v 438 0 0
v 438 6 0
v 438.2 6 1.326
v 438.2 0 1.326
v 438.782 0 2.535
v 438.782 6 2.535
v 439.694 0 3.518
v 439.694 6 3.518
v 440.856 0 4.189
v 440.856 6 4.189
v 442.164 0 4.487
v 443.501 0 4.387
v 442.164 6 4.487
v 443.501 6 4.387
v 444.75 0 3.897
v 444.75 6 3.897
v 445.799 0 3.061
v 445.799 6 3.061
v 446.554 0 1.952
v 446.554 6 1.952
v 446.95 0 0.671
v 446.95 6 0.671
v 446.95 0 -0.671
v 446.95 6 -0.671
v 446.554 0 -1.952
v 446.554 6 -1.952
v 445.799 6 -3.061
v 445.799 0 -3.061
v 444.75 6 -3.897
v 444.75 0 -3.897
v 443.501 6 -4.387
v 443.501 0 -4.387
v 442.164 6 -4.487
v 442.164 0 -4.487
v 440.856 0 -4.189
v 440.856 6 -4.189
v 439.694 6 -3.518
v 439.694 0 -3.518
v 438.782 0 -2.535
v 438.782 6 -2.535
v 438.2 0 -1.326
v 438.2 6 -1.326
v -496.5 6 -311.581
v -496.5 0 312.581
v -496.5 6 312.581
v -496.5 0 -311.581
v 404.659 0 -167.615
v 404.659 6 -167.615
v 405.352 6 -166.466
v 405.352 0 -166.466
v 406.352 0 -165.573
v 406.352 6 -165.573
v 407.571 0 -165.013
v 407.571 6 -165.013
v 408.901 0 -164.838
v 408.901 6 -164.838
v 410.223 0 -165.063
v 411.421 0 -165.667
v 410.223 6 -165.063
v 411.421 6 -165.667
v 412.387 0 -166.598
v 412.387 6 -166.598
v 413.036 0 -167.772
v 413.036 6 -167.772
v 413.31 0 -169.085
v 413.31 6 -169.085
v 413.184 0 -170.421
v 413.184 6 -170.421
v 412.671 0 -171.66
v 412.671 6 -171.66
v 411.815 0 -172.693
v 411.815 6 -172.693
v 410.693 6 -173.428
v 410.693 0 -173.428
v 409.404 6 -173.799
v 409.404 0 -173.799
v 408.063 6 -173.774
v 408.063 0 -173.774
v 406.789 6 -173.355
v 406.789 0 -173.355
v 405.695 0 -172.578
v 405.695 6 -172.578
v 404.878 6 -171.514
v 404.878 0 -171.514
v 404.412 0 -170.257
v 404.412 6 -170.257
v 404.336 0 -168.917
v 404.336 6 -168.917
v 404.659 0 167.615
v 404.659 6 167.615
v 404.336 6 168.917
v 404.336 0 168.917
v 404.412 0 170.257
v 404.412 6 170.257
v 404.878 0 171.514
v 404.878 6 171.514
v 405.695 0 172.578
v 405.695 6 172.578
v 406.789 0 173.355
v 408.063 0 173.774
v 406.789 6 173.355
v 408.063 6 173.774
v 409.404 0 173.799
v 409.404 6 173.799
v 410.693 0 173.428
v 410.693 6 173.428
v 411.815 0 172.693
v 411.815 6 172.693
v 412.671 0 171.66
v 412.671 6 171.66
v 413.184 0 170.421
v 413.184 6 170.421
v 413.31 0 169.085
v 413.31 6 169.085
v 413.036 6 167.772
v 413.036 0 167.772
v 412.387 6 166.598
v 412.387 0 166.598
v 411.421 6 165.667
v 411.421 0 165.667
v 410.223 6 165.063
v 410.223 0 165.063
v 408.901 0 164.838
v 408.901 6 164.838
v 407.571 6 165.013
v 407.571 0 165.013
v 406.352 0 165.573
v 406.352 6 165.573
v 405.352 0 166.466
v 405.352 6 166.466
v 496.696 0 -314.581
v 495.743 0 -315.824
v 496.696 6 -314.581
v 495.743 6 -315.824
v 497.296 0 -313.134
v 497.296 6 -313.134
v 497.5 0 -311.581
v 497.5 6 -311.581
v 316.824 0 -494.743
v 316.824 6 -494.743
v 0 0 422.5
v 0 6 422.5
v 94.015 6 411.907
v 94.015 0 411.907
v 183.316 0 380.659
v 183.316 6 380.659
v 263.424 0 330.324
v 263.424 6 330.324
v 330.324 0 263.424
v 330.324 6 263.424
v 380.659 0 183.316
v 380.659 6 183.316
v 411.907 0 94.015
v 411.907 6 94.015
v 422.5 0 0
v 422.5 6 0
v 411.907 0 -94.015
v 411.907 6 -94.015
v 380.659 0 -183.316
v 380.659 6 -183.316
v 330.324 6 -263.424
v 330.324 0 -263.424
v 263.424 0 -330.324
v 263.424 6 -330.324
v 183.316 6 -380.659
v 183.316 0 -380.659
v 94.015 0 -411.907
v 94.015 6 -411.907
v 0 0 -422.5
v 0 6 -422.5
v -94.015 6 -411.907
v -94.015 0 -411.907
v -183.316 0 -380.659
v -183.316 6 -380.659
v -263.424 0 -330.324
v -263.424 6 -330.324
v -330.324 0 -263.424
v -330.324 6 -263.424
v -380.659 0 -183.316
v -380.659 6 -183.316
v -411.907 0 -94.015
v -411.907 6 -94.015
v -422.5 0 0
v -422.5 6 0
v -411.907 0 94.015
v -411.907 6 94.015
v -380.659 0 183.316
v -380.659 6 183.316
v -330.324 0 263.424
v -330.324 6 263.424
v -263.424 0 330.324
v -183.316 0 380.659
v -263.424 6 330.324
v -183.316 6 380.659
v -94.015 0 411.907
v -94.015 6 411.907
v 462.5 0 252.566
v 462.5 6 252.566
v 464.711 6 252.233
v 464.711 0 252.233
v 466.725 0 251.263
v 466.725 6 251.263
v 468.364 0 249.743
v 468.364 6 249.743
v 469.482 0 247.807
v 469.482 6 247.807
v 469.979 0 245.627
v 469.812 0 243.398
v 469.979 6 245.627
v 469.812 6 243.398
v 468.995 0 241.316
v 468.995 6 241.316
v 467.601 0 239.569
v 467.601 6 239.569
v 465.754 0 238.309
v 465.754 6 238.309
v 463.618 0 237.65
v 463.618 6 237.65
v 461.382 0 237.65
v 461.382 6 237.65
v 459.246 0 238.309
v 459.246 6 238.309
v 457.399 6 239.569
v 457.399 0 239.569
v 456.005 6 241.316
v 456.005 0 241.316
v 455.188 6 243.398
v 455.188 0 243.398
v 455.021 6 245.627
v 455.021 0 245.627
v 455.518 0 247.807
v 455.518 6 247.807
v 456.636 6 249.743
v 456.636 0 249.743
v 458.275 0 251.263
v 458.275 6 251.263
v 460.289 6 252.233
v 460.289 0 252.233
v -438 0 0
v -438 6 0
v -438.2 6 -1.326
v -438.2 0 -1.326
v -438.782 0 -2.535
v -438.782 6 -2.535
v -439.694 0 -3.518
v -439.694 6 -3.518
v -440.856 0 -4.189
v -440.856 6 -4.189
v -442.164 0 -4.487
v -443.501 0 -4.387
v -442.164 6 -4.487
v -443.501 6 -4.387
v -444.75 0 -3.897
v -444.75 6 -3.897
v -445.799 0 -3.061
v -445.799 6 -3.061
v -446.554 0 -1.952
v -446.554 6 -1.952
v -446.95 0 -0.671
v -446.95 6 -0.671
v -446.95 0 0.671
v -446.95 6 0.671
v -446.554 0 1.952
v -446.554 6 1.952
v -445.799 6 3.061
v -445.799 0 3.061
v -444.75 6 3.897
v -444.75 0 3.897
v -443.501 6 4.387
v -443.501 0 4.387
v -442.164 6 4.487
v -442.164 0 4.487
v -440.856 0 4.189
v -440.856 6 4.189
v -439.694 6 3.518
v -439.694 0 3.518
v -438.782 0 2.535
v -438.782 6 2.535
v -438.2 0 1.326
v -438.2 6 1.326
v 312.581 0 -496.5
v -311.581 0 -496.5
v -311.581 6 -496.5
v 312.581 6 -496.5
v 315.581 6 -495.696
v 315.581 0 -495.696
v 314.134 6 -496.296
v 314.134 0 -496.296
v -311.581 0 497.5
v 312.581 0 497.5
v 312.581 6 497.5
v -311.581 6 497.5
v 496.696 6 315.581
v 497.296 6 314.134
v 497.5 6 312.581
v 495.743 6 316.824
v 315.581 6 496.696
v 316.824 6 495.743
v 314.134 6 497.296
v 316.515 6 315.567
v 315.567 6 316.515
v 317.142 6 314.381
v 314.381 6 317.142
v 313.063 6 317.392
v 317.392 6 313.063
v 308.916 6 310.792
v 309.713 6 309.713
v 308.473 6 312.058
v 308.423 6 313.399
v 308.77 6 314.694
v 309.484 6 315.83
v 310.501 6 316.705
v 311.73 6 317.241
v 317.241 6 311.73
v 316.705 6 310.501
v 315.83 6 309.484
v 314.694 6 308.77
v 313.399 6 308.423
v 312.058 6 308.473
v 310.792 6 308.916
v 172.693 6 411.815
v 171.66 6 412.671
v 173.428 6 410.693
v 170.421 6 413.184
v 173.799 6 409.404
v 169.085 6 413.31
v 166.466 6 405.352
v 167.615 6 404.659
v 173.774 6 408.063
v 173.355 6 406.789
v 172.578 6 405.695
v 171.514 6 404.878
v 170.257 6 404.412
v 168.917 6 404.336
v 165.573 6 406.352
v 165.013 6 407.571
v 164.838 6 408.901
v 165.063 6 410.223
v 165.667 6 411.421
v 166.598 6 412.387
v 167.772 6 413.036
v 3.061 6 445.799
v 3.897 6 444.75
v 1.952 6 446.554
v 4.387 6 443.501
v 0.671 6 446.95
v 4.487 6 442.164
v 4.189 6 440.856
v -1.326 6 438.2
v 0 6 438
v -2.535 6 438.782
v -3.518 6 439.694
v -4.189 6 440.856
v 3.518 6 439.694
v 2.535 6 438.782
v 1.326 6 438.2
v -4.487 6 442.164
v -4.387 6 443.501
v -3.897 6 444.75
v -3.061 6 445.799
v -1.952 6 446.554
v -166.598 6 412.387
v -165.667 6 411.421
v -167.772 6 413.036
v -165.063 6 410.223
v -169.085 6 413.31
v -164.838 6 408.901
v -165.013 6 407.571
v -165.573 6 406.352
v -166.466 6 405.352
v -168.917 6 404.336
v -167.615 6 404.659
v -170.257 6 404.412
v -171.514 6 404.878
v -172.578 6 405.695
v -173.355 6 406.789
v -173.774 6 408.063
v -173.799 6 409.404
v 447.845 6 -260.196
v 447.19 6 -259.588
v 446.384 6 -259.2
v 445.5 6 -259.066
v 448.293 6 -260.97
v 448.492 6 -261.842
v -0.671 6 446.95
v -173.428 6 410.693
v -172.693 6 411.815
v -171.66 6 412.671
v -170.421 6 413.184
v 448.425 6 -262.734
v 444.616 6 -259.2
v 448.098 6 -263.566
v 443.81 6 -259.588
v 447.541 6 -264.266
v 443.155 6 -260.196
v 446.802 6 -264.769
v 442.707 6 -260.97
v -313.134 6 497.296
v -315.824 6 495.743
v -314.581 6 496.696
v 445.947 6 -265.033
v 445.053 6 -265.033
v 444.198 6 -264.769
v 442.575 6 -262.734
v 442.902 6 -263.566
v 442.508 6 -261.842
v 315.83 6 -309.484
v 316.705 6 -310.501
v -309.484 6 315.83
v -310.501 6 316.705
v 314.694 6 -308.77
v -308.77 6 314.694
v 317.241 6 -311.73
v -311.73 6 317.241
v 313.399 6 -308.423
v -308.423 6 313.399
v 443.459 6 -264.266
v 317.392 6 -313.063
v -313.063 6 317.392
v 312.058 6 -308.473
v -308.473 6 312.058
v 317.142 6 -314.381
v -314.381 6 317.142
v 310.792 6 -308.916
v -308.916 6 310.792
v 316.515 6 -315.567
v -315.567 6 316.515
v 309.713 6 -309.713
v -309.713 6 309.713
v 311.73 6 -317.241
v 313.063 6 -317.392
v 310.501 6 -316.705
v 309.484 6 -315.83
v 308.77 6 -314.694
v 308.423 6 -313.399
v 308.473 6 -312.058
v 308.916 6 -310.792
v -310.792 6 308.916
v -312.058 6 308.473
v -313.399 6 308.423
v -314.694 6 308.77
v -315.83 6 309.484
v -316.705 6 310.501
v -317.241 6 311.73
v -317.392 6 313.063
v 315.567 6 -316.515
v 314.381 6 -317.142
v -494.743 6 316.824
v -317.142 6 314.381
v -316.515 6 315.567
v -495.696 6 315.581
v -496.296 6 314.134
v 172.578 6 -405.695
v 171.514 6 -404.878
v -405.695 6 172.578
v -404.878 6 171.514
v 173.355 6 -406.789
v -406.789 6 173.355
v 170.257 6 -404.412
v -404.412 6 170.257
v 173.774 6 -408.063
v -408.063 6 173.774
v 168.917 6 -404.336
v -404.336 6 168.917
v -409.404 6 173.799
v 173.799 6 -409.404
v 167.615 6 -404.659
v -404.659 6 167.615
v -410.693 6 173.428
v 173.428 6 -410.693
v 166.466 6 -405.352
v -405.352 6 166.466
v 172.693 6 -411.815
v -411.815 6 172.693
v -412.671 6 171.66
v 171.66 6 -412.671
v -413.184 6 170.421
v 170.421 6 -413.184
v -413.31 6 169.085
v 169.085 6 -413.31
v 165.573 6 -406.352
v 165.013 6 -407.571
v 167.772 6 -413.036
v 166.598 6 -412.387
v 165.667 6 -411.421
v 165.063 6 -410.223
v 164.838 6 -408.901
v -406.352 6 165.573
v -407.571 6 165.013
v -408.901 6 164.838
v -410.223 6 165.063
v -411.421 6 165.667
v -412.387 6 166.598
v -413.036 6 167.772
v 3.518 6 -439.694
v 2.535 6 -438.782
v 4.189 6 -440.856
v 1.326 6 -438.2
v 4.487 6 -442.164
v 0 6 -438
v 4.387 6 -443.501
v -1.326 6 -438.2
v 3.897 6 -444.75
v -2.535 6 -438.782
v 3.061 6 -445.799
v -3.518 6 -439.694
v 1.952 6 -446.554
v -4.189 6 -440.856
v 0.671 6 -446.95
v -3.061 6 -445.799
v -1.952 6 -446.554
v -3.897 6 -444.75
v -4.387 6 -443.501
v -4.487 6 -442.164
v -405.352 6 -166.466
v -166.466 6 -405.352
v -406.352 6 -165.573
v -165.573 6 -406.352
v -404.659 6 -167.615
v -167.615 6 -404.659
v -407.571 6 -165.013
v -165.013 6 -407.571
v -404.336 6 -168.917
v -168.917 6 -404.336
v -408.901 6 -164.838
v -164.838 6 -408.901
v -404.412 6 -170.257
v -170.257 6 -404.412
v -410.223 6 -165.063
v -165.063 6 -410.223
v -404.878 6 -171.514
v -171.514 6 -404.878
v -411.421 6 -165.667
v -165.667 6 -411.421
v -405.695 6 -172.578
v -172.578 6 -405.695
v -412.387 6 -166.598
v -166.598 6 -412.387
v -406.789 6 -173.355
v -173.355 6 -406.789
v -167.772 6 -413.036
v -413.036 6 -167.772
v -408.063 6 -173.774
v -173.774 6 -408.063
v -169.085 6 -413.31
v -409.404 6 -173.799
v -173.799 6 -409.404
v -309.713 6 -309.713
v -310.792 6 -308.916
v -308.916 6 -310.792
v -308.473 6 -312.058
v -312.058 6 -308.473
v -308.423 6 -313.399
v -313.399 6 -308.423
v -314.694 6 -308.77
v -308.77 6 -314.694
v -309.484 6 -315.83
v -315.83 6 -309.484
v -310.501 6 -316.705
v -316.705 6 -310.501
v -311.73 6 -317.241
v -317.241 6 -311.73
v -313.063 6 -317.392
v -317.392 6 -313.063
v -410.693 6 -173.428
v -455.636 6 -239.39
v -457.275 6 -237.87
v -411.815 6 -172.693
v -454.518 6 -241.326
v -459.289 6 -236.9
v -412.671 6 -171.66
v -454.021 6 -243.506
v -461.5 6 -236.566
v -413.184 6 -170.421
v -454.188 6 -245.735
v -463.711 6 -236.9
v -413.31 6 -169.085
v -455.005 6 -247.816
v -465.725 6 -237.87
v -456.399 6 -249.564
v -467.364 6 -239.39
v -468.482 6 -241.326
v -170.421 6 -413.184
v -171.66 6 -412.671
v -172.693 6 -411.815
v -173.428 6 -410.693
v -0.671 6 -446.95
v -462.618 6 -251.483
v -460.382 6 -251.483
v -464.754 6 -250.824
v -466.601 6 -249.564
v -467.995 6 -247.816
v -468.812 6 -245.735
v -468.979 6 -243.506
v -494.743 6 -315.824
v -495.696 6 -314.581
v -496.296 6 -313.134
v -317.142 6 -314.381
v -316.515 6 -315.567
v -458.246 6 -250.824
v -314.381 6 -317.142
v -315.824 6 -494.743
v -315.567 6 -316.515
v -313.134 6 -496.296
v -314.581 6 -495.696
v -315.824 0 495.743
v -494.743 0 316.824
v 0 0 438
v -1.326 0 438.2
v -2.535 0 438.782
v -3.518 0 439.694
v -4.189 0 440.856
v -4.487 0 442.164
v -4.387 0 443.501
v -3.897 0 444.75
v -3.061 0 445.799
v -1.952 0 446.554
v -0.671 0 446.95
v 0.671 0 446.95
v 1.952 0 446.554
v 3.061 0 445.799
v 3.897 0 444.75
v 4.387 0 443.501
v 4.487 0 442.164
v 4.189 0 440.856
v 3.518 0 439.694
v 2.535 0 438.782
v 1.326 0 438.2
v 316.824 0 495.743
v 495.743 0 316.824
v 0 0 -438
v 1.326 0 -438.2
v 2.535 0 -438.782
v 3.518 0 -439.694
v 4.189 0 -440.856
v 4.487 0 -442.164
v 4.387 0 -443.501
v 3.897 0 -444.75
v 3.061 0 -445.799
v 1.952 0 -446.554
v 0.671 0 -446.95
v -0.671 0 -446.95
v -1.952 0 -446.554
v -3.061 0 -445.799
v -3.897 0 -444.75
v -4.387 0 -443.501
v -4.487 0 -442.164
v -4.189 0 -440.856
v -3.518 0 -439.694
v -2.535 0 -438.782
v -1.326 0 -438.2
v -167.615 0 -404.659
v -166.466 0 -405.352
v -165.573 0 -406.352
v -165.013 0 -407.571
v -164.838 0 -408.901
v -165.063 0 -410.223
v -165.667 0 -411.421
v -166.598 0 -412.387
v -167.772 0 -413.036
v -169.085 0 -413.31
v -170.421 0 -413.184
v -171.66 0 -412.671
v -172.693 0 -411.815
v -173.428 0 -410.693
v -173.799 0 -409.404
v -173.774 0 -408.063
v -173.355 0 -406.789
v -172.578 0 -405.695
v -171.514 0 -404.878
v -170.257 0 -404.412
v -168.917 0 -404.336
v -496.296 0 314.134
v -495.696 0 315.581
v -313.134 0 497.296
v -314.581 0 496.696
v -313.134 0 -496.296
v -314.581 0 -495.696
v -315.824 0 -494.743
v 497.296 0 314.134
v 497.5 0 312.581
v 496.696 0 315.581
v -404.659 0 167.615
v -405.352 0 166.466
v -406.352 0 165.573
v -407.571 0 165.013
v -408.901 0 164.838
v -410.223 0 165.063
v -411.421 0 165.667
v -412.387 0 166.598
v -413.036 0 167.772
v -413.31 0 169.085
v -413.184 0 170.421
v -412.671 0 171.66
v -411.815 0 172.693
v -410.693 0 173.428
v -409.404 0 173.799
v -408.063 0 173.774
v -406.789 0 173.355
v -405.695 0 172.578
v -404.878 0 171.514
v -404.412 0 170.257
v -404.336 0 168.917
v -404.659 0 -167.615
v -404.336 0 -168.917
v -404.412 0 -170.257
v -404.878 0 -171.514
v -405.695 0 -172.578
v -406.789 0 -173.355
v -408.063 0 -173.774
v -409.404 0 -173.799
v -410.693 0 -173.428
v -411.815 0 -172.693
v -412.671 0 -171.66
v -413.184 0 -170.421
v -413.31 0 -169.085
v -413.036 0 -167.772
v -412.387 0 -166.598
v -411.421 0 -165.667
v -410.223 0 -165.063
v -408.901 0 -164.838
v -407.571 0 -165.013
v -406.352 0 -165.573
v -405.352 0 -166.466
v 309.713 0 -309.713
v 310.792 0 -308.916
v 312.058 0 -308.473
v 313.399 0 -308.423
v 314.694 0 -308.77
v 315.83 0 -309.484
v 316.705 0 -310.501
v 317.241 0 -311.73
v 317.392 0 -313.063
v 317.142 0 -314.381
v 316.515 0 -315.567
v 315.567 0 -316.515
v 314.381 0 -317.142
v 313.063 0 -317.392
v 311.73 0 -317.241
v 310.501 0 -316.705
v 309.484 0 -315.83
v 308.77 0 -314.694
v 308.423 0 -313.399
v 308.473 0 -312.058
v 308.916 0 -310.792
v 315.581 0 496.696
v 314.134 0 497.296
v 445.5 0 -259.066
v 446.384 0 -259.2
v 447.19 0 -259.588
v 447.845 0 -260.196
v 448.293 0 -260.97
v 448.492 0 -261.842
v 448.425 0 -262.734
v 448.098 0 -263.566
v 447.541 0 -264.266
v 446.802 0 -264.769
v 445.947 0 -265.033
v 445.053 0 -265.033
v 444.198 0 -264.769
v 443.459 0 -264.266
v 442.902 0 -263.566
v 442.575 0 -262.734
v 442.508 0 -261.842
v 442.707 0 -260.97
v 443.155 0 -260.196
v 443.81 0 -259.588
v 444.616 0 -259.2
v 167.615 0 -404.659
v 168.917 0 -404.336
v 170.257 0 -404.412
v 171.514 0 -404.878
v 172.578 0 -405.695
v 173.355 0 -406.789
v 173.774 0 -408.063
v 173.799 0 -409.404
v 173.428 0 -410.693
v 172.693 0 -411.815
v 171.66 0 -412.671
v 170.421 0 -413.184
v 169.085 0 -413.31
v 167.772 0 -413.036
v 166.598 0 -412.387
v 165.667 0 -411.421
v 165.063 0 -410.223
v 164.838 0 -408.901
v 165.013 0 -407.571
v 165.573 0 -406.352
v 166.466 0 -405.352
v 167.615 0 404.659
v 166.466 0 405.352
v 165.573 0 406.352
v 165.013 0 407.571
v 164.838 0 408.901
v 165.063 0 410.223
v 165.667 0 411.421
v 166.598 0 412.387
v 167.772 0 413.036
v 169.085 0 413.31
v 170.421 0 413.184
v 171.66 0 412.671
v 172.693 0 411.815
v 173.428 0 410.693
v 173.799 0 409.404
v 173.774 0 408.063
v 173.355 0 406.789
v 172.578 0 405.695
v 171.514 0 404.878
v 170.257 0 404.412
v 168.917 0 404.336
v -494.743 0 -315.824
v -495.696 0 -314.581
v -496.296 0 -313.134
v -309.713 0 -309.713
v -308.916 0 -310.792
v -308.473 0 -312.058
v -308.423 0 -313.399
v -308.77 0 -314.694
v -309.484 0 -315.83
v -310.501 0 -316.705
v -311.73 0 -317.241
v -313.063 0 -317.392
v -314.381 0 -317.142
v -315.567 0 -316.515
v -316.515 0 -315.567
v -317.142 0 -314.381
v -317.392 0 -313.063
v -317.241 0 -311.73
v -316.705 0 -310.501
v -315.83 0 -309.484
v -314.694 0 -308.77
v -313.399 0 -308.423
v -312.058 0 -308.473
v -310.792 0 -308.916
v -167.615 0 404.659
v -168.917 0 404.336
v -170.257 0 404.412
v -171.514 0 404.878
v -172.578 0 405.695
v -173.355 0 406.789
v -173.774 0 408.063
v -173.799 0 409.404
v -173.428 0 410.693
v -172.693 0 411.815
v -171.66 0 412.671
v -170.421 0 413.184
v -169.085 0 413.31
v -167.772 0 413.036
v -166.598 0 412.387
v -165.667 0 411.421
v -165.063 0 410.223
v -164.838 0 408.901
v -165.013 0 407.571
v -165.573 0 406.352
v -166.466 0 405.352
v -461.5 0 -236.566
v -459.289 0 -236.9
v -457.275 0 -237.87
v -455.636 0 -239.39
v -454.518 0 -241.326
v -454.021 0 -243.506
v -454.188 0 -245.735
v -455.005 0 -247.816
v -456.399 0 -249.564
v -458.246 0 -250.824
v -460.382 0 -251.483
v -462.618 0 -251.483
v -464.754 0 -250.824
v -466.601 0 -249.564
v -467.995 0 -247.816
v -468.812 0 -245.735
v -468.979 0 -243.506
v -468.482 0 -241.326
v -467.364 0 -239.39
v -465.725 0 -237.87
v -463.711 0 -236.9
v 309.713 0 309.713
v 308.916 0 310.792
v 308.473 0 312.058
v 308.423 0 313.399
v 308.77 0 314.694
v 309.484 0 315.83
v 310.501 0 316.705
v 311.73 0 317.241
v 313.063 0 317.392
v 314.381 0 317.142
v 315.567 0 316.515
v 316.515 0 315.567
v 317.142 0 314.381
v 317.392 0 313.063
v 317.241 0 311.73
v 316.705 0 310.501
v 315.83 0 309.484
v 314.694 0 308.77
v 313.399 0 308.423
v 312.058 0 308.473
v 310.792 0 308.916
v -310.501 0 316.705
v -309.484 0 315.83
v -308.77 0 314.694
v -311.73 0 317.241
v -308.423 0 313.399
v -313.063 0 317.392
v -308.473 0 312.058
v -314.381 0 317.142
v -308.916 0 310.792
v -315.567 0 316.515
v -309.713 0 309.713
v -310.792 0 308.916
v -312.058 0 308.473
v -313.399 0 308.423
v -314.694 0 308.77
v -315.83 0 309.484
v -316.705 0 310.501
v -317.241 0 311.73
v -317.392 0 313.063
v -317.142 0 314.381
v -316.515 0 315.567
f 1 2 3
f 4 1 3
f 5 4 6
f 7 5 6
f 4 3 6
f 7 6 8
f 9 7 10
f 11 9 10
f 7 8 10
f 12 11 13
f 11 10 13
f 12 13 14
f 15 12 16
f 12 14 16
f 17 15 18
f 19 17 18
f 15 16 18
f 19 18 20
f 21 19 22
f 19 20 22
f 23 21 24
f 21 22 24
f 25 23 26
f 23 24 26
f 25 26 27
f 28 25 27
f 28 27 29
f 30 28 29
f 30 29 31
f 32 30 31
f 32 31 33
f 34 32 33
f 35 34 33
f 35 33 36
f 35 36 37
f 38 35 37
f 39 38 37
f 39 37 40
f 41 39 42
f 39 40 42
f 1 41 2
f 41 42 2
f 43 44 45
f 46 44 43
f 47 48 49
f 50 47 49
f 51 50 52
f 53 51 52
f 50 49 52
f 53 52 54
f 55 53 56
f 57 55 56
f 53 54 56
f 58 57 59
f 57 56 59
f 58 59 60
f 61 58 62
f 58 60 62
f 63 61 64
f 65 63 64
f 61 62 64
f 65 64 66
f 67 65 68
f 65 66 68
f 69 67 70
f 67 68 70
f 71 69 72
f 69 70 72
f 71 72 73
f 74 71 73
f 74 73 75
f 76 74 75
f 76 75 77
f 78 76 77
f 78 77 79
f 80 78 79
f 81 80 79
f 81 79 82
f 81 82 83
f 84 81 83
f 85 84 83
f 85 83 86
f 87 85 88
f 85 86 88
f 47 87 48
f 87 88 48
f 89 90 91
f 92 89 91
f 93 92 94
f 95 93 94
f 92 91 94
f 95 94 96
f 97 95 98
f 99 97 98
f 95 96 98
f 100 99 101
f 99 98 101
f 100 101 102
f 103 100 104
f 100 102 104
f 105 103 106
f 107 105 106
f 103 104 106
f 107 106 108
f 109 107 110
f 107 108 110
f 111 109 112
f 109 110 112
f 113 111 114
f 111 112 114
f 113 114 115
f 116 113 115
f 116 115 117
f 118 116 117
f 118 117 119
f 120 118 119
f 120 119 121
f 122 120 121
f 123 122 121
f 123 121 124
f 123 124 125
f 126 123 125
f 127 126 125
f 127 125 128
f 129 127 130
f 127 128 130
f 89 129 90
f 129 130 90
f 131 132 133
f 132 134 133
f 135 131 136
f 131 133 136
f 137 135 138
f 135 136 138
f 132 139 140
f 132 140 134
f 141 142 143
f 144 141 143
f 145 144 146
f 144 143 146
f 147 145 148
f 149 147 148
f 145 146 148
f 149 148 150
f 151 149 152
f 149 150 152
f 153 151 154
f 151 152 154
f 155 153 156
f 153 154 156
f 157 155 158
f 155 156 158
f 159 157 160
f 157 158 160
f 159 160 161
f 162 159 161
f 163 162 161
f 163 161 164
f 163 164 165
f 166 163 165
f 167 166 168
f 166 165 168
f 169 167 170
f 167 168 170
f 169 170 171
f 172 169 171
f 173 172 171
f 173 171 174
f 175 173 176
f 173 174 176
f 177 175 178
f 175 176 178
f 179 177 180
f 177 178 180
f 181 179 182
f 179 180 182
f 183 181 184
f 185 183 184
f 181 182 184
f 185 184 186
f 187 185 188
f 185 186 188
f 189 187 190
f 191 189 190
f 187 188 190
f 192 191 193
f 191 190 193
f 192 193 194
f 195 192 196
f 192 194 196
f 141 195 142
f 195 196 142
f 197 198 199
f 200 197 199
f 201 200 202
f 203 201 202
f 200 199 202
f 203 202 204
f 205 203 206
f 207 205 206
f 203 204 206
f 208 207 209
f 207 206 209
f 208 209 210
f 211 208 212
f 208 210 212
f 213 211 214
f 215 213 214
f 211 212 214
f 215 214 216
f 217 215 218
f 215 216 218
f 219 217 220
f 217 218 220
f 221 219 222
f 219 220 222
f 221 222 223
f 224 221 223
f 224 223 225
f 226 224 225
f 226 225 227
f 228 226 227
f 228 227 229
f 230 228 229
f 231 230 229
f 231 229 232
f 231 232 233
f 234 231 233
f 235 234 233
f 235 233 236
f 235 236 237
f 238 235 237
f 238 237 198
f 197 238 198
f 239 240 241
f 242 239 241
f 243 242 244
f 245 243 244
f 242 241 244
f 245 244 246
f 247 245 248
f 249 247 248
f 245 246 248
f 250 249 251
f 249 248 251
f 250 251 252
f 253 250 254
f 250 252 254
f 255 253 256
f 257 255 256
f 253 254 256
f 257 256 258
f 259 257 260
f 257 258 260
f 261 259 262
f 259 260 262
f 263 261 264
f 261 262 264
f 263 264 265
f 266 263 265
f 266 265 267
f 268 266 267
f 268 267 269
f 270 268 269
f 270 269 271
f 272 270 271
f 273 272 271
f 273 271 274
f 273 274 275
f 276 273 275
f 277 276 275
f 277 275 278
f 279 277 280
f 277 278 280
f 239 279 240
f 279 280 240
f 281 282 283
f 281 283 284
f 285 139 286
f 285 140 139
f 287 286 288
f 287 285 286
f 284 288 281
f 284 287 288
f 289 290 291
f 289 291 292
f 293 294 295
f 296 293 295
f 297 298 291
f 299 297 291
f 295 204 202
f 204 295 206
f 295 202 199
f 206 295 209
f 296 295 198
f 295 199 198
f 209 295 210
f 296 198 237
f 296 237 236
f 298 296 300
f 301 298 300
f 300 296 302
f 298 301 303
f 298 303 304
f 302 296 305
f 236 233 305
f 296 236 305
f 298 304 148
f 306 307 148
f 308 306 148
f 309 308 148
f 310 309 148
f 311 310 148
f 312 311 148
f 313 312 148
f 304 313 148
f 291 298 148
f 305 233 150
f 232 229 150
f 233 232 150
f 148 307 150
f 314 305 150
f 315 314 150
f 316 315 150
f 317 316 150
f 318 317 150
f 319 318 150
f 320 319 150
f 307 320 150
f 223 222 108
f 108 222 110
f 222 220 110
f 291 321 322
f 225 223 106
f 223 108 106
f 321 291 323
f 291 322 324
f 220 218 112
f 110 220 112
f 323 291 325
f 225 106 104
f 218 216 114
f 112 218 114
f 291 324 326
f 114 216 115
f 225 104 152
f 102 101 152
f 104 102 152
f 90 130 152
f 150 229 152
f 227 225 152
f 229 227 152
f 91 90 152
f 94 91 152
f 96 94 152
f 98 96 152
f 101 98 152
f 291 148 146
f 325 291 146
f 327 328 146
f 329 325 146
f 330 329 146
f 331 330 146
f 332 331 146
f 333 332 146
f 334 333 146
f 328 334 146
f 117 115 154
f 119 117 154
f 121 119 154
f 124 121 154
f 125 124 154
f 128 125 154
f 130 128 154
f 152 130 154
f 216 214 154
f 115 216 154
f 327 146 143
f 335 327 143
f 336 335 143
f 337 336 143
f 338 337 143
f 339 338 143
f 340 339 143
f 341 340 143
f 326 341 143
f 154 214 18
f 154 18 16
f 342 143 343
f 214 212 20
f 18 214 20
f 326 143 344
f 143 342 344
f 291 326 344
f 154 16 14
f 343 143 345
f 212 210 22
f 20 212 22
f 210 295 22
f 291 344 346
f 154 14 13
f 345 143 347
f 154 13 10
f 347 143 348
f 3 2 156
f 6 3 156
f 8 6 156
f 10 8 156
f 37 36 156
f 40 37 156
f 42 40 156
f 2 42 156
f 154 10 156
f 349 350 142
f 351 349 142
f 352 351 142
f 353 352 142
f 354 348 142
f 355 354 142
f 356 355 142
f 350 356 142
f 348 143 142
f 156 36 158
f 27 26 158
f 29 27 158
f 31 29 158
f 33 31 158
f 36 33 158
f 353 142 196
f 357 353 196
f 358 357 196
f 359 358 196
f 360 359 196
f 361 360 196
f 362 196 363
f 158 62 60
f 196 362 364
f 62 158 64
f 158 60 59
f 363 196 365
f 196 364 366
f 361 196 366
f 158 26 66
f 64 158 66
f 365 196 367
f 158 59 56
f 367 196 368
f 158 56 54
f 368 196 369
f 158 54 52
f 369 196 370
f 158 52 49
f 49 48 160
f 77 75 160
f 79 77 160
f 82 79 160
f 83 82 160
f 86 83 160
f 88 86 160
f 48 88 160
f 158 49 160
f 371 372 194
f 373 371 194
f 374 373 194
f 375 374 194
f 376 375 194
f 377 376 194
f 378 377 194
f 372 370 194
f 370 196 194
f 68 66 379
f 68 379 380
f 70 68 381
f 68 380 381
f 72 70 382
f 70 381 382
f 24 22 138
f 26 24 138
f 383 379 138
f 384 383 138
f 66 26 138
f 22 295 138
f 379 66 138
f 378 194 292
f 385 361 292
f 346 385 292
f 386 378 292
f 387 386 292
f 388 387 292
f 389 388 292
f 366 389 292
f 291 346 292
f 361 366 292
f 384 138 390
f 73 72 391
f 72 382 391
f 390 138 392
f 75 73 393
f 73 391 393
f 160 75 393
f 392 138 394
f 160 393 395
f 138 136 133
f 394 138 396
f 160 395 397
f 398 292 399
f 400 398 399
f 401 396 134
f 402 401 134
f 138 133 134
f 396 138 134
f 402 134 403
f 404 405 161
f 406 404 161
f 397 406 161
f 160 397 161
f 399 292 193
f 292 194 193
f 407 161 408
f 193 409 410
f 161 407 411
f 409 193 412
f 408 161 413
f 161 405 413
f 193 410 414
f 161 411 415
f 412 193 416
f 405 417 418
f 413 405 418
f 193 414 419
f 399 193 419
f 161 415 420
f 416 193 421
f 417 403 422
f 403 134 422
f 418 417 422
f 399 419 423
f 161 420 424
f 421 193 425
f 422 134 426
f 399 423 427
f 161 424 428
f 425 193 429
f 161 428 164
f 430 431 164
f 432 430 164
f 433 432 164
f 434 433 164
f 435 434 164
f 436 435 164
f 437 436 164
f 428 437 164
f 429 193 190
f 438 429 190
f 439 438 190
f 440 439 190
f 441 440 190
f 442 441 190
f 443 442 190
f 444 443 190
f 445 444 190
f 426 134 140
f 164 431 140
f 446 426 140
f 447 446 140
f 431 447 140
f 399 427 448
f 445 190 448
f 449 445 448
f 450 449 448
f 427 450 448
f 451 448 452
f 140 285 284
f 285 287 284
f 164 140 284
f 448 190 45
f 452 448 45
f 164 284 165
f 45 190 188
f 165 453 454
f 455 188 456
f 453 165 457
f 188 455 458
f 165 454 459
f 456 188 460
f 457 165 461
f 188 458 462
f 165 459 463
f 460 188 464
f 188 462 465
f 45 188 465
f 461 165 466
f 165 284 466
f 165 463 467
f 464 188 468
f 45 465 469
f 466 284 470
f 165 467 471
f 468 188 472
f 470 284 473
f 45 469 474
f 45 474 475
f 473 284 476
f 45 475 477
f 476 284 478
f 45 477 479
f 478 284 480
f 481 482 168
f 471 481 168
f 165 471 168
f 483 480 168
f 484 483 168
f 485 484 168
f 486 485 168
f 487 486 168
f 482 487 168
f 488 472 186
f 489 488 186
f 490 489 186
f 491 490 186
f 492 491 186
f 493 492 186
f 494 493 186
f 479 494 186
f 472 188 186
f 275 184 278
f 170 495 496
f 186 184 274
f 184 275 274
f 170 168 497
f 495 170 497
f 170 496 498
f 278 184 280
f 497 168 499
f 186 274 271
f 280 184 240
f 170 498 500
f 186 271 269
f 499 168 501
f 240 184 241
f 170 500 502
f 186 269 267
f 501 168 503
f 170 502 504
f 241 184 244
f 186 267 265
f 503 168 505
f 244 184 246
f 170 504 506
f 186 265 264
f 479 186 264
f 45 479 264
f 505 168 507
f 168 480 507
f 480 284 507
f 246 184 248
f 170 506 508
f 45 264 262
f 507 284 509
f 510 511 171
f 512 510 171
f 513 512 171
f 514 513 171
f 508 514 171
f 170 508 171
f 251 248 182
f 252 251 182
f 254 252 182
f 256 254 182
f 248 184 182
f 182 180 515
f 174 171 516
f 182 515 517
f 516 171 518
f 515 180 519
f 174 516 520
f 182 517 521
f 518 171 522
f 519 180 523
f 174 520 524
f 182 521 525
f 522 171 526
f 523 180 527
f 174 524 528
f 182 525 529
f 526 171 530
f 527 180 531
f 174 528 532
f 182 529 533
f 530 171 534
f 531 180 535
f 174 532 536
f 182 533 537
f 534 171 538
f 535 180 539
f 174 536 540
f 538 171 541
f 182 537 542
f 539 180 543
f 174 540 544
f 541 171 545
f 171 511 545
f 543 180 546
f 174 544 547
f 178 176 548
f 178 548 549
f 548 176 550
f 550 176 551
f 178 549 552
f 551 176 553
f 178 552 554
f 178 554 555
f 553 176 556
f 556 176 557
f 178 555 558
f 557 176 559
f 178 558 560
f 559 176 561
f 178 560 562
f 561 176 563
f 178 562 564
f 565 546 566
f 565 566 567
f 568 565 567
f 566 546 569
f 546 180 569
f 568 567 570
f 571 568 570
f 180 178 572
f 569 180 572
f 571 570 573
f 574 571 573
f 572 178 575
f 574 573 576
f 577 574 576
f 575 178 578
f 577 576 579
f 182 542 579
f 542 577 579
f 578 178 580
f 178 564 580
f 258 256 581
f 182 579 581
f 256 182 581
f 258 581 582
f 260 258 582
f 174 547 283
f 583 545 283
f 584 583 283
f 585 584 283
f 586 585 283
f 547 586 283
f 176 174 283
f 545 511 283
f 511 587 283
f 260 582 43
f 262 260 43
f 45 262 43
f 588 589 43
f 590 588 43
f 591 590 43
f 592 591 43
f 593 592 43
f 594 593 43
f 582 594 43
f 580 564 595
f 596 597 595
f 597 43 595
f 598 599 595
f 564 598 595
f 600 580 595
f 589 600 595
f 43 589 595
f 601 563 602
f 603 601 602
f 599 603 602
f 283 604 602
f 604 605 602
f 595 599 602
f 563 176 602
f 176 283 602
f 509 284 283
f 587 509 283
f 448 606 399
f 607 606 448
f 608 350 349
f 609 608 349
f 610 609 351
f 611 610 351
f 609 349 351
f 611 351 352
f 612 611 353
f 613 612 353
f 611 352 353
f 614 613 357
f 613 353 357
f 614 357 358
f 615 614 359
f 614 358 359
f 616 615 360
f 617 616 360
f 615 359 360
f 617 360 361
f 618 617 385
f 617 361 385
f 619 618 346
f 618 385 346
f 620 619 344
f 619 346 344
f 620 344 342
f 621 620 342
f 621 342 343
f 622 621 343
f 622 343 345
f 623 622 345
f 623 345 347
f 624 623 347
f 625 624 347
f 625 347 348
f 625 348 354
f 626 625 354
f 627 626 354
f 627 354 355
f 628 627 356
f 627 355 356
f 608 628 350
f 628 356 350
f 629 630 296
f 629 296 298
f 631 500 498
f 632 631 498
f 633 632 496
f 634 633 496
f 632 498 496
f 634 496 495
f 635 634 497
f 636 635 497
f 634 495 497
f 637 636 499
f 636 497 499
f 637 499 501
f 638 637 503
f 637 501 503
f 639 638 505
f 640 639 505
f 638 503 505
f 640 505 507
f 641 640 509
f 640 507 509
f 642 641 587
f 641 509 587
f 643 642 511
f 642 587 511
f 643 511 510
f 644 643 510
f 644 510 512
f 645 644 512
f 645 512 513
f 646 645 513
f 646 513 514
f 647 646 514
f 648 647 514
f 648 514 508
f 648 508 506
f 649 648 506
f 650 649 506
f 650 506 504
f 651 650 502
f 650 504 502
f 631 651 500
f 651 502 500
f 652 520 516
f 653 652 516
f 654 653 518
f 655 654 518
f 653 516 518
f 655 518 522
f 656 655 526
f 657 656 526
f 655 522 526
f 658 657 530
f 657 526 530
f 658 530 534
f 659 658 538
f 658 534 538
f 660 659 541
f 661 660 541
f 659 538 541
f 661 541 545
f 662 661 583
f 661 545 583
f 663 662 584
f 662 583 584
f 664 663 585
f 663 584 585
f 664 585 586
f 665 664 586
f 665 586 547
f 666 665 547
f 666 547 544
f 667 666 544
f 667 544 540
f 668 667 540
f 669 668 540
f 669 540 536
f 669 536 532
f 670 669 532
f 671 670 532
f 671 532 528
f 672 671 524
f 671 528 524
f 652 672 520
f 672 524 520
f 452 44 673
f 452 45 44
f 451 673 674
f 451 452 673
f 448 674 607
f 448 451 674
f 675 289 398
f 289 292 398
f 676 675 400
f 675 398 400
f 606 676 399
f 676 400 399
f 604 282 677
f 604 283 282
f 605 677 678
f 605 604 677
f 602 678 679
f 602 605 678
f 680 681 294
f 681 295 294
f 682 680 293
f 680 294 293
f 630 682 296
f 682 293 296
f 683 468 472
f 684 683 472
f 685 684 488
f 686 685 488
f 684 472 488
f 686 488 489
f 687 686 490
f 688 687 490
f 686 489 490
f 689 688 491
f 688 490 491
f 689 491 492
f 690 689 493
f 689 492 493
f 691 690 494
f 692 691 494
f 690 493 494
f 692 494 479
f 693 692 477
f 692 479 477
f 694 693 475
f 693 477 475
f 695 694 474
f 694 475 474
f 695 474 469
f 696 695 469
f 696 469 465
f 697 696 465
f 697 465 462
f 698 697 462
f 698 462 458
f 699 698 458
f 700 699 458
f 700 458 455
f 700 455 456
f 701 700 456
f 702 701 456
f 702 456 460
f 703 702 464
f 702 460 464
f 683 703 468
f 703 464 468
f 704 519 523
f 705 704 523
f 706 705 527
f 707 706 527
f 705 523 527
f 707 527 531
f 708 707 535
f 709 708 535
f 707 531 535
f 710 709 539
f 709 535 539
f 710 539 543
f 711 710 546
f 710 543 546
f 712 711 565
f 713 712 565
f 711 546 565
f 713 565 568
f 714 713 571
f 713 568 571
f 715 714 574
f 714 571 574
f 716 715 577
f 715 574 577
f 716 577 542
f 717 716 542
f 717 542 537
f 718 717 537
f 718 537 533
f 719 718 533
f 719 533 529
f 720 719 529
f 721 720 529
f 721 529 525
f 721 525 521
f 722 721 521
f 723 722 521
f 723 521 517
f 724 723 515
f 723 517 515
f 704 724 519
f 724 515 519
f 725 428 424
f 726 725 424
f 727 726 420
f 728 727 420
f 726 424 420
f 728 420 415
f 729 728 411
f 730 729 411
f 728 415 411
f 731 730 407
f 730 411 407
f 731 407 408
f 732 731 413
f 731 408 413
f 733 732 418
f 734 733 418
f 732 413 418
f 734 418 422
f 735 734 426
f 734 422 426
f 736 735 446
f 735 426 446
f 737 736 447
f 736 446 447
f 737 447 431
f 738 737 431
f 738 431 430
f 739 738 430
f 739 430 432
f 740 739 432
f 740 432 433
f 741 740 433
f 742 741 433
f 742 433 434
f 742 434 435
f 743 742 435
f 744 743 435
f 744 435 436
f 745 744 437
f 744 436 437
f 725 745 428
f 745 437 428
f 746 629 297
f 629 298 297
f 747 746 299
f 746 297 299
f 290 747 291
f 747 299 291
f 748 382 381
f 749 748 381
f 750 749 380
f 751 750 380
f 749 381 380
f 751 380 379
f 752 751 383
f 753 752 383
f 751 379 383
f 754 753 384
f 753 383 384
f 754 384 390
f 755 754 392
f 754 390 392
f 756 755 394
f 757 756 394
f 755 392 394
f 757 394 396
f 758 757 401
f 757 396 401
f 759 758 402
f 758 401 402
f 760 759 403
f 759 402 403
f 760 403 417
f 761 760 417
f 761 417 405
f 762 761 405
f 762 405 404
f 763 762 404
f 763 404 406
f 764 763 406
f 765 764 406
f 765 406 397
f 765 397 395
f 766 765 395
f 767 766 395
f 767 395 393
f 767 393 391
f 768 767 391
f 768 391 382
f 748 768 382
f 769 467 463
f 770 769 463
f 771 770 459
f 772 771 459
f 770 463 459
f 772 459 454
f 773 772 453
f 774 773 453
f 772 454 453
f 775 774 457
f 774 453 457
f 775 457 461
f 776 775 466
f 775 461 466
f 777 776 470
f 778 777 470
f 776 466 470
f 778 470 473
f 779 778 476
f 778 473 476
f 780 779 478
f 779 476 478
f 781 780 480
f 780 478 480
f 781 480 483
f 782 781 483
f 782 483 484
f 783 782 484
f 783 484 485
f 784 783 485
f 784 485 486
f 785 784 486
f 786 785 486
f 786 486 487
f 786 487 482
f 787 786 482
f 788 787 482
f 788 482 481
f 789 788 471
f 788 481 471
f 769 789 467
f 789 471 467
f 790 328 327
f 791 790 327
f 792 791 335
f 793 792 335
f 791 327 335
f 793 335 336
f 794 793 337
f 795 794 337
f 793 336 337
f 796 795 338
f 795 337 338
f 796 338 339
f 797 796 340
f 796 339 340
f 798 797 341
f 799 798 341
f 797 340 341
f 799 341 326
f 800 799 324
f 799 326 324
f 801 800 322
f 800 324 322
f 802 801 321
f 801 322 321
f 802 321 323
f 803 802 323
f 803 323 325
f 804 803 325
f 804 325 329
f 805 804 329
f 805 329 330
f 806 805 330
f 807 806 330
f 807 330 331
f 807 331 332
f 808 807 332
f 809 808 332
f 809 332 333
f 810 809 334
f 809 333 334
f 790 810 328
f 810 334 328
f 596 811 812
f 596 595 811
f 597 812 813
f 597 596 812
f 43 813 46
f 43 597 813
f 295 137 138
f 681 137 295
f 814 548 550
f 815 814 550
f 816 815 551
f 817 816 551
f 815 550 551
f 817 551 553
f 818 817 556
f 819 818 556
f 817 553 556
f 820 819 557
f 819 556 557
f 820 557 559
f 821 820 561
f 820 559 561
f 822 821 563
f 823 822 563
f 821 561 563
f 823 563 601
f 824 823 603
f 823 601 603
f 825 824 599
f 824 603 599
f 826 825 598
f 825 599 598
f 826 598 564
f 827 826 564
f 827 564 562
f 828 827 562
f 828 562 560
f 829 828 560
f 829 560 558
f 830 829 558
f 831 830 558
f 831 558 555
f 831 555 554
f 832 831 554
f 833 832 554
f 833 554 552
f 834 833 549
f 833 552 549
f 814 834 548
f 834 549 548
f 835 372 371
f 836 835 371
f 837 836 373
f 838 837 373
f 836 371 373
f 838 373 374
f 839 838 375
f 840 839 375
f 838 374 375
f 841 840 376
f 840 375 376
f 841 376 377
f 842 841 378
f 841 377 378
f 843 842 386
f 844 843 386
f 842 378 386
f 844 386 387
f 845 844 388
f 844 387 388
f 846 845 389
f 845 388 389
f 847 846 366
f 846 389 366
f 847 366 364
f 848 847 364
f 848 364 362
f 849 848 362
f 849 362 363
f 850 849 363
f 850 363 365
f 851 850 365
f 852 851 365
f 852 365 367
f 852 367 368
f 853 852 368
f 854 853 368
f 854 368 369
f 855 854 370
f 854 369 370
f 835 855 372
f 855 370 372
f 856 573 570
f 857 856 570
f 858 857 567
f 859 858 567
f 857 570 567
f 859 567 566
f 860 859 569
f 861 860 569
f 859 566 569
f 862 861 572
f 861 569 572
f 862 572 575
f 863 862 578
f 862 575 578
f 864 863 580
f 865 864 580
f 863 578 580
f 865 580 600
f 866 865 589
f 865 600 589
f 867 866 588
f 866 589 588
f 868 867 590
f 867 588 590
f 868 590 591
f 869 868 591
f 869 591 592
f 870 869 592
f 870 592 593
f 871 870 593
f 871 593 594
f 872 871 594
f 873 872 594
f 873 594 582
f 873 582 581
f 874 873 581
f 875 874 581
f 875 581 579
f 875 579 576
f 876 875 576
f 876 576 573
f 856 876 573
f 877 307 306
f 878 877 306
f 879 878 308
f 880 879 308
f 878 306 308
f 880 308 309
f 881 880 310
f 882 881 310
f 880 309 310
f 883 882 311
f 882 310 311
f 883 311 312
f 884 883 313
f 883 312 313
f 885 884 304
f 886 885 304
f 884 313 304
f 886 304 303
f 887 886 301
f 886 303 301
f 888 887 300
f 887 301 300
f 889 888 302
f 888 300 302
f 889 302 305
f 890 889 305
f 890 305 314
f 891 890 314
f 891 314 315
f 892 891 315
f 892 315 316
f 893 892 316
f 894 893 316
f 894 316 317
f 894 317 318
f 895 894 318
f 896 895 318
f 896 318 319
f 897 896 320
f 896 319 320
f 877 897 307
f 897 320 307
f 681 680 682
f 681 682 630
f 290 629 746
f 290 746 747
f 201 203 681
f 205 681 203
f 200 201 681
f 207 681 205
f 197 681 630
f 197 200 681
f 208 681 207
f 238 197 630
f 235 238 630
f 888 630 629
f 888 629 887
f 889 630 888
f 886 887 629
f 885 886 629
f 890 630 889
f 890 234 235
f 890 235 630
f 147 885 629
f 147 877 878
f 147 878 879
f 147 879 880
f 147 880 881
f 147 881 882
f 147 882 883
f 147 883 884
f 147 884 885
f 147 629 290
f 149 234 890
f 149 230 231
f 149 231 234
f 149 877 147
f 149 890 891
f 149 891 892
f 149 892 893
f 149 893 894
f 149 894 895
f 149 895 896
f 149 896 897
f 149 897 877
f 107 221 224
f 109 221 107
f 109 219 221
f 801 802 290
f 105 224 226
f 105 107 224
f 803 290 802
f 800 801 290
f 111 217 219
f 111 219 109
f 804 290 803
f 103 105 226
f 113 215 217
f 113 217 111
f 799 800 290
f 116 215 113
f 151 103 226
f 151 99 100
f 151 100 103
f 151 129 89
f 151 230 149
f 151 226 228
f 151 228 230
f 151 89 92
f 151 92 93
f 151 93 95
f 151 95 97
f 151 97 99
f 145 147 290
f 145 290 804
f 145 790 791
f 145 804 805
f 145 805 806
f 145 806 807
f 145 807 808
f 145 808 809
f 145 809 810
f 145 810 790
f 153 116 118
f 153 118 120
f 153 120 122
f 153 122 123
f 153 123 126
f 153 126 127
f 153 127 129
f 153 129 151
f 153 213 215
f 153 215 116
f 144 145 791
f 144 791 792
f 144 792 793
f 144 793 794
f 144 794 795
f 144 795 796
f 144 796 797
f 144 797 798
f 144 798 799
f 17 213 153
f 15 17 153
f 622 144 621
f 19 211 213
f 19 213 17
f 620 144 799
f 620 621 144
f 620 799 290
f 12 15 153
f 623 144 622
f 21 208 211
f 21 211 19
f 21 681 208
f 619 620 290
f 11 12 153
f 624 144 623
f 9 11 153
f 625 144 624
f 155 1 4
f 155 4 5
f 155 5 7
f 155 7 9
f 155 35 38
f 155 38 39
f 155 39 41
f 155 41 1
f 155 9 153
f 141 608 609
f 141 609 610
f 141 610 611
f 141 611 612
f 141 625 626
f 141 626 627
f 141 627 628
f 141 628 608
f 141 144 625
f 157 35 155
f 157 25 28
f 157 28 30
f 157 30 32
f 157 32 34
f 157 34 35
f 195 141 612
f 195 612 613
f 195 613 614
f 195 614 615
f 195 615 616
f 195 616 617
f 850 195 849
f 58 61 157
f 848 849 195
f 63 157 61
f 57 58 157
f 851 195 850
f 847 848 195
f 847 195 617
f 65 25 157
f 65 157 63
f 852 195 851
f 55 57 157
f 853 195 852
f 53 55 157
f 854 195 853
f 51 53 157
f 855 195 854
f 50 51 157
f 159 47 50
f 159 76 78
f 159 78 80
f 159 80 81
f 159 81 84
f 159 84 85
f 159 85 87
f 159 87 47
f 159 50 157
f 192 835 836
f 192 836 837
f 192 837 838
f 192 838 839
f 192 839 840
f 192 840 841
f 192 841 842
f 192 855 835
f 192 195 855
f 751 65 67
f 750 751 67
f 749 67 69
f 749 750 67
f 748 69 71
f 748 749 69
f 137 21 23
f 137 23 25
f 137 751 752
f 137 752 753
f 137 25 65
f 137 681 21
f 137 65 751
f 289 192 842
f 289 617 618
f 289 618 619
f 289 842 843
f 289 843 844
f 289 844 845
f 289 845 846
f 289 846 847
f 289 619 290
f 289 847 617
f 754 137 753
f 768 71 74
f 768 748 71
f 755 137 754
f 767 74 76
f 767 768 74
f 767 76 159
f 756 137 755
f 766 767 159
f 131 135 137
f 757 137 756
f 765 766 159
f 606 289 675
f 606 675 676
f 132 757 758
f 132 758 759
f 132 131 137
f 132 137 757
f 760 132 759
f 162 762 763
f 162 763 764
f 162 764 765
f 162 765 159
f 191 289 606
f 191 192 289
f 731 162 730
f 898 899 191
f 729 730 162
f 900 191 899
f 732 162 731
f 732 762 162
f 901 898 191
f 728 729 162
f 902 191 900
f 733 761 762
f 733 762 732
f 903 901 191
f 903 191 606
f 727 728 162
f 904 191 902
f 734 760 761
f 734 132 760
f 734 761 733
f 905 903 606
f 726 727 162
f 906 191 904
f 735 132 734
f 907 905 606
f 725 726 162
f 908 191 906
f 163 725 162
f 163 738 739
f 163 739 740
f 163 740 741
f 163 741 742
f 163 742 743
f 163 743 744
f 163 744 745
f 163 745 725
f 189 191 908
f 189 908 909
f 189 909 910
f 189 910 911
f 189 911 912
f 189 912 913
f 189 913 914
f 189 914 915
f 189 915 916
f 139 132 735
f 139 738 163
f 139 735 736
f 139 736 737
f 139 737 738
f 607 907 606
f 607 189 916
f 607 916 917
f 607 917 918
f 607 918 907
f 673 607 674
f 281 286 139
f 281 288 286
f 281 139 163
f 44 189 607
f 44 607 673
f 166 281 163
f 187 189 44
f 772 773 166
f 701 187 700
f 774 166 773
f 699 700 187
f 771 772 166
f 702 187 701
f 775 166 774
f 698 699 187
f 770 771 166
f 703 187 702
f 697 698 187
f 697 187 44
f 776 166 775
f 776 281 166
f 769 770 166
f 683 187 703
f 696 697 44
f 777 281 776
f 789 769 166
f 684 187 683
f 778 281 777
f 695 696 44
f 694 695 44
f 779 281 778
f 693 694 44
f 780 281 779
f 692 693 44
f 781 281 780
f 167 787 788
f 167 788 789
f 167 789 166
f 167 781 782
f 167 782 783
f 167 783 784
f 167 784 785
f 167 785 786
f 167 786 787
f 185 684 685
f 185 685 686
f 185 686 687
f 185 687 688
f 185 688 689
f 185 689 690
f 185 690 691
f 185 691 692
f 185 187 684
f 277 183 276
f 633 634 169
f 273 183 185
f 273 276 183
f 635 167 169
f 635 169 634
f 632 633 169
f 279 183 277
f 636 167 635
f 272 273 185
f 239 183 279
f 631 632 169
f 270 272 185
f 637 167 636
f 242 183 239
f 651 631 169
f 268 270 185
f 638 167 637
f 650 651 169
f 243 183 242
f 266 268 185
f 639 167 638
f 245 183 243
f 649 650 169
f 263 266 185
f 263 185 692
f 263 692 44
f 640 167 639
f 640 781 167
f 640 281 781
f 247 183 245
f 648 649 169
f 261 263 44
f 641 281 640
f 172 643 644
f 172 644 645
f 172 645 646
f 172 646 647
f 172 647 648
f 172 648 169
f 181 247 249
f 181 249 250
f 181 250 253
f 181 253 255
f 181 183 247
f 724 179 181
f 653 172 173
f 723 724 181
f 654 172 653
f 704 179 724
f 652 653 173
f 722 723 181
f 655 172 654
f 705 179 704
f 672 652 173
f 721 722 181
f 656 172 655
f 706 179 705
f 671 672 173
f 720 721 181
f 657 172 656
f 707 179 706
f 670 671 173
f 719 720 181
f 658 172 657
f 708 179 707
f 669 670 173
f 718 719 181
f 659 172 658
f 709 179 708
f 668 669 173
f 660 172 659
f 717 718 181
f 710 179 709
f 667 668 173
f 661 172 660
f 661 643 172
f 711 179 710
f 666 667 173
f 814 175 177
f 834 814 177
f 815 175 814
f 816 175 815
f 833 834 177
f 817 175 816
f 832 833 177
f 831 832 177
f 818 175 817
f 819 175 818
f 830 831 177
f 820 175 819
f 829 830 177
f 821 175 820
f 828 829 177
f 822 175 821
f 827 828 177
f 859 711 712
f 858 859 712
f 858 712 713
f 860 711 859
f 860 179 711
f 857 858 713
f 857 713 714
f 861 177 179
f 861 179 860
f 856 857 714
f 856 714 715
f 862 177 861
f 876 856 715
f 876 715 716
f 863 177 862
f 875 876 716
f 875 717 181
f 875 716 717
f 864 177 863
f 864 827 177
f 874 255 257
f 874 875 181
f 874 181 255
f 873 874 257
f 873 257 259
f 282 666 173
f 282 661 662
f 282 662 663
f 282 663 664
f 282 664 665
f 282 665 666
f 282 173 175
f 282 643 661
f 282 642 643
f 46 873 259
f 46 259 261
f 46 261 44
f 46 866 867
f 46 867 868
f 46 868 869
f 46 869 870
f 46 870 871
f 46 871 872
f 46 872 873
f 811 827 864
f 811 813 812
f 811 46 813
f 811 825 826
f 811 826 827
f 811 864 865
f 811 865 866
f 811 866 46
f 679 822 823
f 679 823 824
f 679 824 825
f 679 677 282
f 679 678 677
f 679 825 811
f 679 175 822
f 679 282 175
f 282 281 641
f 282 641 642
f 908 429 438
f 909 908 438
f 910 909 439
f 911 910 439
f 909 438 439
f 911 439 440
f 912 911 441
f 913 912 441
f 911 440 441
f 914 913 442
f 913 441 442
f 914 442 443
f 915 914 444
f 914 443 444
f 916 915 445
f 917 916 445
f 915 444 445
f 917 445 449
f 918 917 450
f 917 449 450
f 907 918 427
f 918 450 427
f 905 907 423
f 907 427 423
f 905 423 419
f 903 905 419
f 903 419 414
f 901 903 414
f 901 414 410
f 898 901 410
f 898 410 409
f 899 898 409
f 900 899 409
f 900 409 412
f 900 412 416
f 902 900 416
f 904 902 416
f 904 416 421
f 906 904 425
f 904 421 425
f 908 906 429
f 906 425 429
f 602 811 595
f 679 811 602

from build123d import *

# Parameters (mm, degrees)
BOSS_EXTRUDE1_DEPTH = 6
SKETCH2_R           = 422.5
CUT_EXTRUDE1_DEPTH  = 6
SKETCH3_R           = 4.5
CUT_EXTRUDE2_DEPTH  = 6
CIRPATTERN1_COUNT   = 16
SKETCH4_R           = 3
CUT_EXTRUDE3_DEPTH  = 10
SKETCH5_R           = 7.5
CUT_EXTRUDE4_DEPTH  = 10
FILLET1_R           = 6


with BuildPart() as part:
    # Sketch1 → Boss-Extrude1 (new body)
    with BuildSketch(Plane(origin=(0, 0, 0), x_dir=(1, 0, 0), z_dir=(0, 1, 0))):
        Polygon((315.066450454, 496.5), (497.5, 314.066450454), (497.5, -315.066450454), (315.066450454, -497.5), (-314.066450454, -497.5), (-496.5, -315.066450454), (-496.5, 314.066450454), (-314.066450454, 496.5), align=None)
    extrude(amount=BOSS_EXTRUDE1_DEPTH)

    # Sketch2 → Cut-Extrude1 (cut)
    with BuildSketch(Plane(origin=(0, 6, 0), x_dir=(1, 0, 0), z_dir=(0, 1, 0))):
        with Locations(Location((0, 0, 0), (0, 0, 270))):
            Circle(SKETCH2_R)
    extrude(amount=-CUT_EXTRUDE1_DEPTH, mode=Mode.SUBTRACT)

    # Sketch3 → Cut-Extrude2 (cut)
    with BuildSketch(Plane(origin=(0, 6, 0), x_dir=(1, 0, 0), z_dir=(0, 1, 0))):
        with Locations(Location((0, 442.5, 0), (0, 0, 270))):
            Circle(SKETCH3_R)
    cut_extrude2 = extrude(amount=-CUT_EXTRUDE2_DEPTH, mode=Mode.SUBTRACT)

    # CirPattern1: Cut-Extrude2 ×16 about axis
    cirpattern1_axis = Axis((0, 0, 0), (0, 1, 0))
    for i in range(1, CIRPATTERN1_COUNT):
        add(cut_extrude2.rotate(cirpattern1_axis, i * 360 / CIRPATTERN1_COUNT), mode=Mode.SUBTRACT)

    # Sketch4 → Cut-Extrude3 (cut)
    with BuildSketch(Plane(origin=(0, 6, 0), x_dir=(1, 0, 0), z_dir=(0, 1, 0))):
        with Locations(Location((445.5, 262.066450454, 0), (0, 0, 270))):
            Circle(SKETCH4_R)
    extrude(amount=-CUT_EXTRUDE3_DEPTH, mode=Mode.SUBTRACT)

    # Sketch5 → Cut-Extrude4 (cut)
    with BuildSketch(Plane(origin=(0, 6, 0), x_dir=(1, 0, 0), z_dir=(0, 1, 0))):
        with Locations(Location((-461.5, 244.066450454, 0), (0, 0, 270))):
            Circle(SKETCH5_R)
        with Locations(Location((462.5, -245.066450454, 0), (0, 0, 270))):
            Circle(SKETCH5_R)
    extrude(amount=-CUT_EXTRUDE4_DEPTH, mode=Mode.SUBTRACT)

    # Fillet1
    fillet1_edges = [part.edges().sort_by_distance(p)[0] for p in [
        (315.066450454, 3, -496.5),
        (497.5, 3, -314.066450454),
        (497.5, 3, 315.066450454),
        (315.066450454, 3, 497.5),
        (-314.066450454, 3, 497.5),
        (-496.5, 3, 315.066450454),
        (-496.5, 3, -314.066450454),
        (-314.066450454, 3, -496.5),
    ]]
    fillet(fillet1_edges, radius=FILLET1_R)


solid = part.part
